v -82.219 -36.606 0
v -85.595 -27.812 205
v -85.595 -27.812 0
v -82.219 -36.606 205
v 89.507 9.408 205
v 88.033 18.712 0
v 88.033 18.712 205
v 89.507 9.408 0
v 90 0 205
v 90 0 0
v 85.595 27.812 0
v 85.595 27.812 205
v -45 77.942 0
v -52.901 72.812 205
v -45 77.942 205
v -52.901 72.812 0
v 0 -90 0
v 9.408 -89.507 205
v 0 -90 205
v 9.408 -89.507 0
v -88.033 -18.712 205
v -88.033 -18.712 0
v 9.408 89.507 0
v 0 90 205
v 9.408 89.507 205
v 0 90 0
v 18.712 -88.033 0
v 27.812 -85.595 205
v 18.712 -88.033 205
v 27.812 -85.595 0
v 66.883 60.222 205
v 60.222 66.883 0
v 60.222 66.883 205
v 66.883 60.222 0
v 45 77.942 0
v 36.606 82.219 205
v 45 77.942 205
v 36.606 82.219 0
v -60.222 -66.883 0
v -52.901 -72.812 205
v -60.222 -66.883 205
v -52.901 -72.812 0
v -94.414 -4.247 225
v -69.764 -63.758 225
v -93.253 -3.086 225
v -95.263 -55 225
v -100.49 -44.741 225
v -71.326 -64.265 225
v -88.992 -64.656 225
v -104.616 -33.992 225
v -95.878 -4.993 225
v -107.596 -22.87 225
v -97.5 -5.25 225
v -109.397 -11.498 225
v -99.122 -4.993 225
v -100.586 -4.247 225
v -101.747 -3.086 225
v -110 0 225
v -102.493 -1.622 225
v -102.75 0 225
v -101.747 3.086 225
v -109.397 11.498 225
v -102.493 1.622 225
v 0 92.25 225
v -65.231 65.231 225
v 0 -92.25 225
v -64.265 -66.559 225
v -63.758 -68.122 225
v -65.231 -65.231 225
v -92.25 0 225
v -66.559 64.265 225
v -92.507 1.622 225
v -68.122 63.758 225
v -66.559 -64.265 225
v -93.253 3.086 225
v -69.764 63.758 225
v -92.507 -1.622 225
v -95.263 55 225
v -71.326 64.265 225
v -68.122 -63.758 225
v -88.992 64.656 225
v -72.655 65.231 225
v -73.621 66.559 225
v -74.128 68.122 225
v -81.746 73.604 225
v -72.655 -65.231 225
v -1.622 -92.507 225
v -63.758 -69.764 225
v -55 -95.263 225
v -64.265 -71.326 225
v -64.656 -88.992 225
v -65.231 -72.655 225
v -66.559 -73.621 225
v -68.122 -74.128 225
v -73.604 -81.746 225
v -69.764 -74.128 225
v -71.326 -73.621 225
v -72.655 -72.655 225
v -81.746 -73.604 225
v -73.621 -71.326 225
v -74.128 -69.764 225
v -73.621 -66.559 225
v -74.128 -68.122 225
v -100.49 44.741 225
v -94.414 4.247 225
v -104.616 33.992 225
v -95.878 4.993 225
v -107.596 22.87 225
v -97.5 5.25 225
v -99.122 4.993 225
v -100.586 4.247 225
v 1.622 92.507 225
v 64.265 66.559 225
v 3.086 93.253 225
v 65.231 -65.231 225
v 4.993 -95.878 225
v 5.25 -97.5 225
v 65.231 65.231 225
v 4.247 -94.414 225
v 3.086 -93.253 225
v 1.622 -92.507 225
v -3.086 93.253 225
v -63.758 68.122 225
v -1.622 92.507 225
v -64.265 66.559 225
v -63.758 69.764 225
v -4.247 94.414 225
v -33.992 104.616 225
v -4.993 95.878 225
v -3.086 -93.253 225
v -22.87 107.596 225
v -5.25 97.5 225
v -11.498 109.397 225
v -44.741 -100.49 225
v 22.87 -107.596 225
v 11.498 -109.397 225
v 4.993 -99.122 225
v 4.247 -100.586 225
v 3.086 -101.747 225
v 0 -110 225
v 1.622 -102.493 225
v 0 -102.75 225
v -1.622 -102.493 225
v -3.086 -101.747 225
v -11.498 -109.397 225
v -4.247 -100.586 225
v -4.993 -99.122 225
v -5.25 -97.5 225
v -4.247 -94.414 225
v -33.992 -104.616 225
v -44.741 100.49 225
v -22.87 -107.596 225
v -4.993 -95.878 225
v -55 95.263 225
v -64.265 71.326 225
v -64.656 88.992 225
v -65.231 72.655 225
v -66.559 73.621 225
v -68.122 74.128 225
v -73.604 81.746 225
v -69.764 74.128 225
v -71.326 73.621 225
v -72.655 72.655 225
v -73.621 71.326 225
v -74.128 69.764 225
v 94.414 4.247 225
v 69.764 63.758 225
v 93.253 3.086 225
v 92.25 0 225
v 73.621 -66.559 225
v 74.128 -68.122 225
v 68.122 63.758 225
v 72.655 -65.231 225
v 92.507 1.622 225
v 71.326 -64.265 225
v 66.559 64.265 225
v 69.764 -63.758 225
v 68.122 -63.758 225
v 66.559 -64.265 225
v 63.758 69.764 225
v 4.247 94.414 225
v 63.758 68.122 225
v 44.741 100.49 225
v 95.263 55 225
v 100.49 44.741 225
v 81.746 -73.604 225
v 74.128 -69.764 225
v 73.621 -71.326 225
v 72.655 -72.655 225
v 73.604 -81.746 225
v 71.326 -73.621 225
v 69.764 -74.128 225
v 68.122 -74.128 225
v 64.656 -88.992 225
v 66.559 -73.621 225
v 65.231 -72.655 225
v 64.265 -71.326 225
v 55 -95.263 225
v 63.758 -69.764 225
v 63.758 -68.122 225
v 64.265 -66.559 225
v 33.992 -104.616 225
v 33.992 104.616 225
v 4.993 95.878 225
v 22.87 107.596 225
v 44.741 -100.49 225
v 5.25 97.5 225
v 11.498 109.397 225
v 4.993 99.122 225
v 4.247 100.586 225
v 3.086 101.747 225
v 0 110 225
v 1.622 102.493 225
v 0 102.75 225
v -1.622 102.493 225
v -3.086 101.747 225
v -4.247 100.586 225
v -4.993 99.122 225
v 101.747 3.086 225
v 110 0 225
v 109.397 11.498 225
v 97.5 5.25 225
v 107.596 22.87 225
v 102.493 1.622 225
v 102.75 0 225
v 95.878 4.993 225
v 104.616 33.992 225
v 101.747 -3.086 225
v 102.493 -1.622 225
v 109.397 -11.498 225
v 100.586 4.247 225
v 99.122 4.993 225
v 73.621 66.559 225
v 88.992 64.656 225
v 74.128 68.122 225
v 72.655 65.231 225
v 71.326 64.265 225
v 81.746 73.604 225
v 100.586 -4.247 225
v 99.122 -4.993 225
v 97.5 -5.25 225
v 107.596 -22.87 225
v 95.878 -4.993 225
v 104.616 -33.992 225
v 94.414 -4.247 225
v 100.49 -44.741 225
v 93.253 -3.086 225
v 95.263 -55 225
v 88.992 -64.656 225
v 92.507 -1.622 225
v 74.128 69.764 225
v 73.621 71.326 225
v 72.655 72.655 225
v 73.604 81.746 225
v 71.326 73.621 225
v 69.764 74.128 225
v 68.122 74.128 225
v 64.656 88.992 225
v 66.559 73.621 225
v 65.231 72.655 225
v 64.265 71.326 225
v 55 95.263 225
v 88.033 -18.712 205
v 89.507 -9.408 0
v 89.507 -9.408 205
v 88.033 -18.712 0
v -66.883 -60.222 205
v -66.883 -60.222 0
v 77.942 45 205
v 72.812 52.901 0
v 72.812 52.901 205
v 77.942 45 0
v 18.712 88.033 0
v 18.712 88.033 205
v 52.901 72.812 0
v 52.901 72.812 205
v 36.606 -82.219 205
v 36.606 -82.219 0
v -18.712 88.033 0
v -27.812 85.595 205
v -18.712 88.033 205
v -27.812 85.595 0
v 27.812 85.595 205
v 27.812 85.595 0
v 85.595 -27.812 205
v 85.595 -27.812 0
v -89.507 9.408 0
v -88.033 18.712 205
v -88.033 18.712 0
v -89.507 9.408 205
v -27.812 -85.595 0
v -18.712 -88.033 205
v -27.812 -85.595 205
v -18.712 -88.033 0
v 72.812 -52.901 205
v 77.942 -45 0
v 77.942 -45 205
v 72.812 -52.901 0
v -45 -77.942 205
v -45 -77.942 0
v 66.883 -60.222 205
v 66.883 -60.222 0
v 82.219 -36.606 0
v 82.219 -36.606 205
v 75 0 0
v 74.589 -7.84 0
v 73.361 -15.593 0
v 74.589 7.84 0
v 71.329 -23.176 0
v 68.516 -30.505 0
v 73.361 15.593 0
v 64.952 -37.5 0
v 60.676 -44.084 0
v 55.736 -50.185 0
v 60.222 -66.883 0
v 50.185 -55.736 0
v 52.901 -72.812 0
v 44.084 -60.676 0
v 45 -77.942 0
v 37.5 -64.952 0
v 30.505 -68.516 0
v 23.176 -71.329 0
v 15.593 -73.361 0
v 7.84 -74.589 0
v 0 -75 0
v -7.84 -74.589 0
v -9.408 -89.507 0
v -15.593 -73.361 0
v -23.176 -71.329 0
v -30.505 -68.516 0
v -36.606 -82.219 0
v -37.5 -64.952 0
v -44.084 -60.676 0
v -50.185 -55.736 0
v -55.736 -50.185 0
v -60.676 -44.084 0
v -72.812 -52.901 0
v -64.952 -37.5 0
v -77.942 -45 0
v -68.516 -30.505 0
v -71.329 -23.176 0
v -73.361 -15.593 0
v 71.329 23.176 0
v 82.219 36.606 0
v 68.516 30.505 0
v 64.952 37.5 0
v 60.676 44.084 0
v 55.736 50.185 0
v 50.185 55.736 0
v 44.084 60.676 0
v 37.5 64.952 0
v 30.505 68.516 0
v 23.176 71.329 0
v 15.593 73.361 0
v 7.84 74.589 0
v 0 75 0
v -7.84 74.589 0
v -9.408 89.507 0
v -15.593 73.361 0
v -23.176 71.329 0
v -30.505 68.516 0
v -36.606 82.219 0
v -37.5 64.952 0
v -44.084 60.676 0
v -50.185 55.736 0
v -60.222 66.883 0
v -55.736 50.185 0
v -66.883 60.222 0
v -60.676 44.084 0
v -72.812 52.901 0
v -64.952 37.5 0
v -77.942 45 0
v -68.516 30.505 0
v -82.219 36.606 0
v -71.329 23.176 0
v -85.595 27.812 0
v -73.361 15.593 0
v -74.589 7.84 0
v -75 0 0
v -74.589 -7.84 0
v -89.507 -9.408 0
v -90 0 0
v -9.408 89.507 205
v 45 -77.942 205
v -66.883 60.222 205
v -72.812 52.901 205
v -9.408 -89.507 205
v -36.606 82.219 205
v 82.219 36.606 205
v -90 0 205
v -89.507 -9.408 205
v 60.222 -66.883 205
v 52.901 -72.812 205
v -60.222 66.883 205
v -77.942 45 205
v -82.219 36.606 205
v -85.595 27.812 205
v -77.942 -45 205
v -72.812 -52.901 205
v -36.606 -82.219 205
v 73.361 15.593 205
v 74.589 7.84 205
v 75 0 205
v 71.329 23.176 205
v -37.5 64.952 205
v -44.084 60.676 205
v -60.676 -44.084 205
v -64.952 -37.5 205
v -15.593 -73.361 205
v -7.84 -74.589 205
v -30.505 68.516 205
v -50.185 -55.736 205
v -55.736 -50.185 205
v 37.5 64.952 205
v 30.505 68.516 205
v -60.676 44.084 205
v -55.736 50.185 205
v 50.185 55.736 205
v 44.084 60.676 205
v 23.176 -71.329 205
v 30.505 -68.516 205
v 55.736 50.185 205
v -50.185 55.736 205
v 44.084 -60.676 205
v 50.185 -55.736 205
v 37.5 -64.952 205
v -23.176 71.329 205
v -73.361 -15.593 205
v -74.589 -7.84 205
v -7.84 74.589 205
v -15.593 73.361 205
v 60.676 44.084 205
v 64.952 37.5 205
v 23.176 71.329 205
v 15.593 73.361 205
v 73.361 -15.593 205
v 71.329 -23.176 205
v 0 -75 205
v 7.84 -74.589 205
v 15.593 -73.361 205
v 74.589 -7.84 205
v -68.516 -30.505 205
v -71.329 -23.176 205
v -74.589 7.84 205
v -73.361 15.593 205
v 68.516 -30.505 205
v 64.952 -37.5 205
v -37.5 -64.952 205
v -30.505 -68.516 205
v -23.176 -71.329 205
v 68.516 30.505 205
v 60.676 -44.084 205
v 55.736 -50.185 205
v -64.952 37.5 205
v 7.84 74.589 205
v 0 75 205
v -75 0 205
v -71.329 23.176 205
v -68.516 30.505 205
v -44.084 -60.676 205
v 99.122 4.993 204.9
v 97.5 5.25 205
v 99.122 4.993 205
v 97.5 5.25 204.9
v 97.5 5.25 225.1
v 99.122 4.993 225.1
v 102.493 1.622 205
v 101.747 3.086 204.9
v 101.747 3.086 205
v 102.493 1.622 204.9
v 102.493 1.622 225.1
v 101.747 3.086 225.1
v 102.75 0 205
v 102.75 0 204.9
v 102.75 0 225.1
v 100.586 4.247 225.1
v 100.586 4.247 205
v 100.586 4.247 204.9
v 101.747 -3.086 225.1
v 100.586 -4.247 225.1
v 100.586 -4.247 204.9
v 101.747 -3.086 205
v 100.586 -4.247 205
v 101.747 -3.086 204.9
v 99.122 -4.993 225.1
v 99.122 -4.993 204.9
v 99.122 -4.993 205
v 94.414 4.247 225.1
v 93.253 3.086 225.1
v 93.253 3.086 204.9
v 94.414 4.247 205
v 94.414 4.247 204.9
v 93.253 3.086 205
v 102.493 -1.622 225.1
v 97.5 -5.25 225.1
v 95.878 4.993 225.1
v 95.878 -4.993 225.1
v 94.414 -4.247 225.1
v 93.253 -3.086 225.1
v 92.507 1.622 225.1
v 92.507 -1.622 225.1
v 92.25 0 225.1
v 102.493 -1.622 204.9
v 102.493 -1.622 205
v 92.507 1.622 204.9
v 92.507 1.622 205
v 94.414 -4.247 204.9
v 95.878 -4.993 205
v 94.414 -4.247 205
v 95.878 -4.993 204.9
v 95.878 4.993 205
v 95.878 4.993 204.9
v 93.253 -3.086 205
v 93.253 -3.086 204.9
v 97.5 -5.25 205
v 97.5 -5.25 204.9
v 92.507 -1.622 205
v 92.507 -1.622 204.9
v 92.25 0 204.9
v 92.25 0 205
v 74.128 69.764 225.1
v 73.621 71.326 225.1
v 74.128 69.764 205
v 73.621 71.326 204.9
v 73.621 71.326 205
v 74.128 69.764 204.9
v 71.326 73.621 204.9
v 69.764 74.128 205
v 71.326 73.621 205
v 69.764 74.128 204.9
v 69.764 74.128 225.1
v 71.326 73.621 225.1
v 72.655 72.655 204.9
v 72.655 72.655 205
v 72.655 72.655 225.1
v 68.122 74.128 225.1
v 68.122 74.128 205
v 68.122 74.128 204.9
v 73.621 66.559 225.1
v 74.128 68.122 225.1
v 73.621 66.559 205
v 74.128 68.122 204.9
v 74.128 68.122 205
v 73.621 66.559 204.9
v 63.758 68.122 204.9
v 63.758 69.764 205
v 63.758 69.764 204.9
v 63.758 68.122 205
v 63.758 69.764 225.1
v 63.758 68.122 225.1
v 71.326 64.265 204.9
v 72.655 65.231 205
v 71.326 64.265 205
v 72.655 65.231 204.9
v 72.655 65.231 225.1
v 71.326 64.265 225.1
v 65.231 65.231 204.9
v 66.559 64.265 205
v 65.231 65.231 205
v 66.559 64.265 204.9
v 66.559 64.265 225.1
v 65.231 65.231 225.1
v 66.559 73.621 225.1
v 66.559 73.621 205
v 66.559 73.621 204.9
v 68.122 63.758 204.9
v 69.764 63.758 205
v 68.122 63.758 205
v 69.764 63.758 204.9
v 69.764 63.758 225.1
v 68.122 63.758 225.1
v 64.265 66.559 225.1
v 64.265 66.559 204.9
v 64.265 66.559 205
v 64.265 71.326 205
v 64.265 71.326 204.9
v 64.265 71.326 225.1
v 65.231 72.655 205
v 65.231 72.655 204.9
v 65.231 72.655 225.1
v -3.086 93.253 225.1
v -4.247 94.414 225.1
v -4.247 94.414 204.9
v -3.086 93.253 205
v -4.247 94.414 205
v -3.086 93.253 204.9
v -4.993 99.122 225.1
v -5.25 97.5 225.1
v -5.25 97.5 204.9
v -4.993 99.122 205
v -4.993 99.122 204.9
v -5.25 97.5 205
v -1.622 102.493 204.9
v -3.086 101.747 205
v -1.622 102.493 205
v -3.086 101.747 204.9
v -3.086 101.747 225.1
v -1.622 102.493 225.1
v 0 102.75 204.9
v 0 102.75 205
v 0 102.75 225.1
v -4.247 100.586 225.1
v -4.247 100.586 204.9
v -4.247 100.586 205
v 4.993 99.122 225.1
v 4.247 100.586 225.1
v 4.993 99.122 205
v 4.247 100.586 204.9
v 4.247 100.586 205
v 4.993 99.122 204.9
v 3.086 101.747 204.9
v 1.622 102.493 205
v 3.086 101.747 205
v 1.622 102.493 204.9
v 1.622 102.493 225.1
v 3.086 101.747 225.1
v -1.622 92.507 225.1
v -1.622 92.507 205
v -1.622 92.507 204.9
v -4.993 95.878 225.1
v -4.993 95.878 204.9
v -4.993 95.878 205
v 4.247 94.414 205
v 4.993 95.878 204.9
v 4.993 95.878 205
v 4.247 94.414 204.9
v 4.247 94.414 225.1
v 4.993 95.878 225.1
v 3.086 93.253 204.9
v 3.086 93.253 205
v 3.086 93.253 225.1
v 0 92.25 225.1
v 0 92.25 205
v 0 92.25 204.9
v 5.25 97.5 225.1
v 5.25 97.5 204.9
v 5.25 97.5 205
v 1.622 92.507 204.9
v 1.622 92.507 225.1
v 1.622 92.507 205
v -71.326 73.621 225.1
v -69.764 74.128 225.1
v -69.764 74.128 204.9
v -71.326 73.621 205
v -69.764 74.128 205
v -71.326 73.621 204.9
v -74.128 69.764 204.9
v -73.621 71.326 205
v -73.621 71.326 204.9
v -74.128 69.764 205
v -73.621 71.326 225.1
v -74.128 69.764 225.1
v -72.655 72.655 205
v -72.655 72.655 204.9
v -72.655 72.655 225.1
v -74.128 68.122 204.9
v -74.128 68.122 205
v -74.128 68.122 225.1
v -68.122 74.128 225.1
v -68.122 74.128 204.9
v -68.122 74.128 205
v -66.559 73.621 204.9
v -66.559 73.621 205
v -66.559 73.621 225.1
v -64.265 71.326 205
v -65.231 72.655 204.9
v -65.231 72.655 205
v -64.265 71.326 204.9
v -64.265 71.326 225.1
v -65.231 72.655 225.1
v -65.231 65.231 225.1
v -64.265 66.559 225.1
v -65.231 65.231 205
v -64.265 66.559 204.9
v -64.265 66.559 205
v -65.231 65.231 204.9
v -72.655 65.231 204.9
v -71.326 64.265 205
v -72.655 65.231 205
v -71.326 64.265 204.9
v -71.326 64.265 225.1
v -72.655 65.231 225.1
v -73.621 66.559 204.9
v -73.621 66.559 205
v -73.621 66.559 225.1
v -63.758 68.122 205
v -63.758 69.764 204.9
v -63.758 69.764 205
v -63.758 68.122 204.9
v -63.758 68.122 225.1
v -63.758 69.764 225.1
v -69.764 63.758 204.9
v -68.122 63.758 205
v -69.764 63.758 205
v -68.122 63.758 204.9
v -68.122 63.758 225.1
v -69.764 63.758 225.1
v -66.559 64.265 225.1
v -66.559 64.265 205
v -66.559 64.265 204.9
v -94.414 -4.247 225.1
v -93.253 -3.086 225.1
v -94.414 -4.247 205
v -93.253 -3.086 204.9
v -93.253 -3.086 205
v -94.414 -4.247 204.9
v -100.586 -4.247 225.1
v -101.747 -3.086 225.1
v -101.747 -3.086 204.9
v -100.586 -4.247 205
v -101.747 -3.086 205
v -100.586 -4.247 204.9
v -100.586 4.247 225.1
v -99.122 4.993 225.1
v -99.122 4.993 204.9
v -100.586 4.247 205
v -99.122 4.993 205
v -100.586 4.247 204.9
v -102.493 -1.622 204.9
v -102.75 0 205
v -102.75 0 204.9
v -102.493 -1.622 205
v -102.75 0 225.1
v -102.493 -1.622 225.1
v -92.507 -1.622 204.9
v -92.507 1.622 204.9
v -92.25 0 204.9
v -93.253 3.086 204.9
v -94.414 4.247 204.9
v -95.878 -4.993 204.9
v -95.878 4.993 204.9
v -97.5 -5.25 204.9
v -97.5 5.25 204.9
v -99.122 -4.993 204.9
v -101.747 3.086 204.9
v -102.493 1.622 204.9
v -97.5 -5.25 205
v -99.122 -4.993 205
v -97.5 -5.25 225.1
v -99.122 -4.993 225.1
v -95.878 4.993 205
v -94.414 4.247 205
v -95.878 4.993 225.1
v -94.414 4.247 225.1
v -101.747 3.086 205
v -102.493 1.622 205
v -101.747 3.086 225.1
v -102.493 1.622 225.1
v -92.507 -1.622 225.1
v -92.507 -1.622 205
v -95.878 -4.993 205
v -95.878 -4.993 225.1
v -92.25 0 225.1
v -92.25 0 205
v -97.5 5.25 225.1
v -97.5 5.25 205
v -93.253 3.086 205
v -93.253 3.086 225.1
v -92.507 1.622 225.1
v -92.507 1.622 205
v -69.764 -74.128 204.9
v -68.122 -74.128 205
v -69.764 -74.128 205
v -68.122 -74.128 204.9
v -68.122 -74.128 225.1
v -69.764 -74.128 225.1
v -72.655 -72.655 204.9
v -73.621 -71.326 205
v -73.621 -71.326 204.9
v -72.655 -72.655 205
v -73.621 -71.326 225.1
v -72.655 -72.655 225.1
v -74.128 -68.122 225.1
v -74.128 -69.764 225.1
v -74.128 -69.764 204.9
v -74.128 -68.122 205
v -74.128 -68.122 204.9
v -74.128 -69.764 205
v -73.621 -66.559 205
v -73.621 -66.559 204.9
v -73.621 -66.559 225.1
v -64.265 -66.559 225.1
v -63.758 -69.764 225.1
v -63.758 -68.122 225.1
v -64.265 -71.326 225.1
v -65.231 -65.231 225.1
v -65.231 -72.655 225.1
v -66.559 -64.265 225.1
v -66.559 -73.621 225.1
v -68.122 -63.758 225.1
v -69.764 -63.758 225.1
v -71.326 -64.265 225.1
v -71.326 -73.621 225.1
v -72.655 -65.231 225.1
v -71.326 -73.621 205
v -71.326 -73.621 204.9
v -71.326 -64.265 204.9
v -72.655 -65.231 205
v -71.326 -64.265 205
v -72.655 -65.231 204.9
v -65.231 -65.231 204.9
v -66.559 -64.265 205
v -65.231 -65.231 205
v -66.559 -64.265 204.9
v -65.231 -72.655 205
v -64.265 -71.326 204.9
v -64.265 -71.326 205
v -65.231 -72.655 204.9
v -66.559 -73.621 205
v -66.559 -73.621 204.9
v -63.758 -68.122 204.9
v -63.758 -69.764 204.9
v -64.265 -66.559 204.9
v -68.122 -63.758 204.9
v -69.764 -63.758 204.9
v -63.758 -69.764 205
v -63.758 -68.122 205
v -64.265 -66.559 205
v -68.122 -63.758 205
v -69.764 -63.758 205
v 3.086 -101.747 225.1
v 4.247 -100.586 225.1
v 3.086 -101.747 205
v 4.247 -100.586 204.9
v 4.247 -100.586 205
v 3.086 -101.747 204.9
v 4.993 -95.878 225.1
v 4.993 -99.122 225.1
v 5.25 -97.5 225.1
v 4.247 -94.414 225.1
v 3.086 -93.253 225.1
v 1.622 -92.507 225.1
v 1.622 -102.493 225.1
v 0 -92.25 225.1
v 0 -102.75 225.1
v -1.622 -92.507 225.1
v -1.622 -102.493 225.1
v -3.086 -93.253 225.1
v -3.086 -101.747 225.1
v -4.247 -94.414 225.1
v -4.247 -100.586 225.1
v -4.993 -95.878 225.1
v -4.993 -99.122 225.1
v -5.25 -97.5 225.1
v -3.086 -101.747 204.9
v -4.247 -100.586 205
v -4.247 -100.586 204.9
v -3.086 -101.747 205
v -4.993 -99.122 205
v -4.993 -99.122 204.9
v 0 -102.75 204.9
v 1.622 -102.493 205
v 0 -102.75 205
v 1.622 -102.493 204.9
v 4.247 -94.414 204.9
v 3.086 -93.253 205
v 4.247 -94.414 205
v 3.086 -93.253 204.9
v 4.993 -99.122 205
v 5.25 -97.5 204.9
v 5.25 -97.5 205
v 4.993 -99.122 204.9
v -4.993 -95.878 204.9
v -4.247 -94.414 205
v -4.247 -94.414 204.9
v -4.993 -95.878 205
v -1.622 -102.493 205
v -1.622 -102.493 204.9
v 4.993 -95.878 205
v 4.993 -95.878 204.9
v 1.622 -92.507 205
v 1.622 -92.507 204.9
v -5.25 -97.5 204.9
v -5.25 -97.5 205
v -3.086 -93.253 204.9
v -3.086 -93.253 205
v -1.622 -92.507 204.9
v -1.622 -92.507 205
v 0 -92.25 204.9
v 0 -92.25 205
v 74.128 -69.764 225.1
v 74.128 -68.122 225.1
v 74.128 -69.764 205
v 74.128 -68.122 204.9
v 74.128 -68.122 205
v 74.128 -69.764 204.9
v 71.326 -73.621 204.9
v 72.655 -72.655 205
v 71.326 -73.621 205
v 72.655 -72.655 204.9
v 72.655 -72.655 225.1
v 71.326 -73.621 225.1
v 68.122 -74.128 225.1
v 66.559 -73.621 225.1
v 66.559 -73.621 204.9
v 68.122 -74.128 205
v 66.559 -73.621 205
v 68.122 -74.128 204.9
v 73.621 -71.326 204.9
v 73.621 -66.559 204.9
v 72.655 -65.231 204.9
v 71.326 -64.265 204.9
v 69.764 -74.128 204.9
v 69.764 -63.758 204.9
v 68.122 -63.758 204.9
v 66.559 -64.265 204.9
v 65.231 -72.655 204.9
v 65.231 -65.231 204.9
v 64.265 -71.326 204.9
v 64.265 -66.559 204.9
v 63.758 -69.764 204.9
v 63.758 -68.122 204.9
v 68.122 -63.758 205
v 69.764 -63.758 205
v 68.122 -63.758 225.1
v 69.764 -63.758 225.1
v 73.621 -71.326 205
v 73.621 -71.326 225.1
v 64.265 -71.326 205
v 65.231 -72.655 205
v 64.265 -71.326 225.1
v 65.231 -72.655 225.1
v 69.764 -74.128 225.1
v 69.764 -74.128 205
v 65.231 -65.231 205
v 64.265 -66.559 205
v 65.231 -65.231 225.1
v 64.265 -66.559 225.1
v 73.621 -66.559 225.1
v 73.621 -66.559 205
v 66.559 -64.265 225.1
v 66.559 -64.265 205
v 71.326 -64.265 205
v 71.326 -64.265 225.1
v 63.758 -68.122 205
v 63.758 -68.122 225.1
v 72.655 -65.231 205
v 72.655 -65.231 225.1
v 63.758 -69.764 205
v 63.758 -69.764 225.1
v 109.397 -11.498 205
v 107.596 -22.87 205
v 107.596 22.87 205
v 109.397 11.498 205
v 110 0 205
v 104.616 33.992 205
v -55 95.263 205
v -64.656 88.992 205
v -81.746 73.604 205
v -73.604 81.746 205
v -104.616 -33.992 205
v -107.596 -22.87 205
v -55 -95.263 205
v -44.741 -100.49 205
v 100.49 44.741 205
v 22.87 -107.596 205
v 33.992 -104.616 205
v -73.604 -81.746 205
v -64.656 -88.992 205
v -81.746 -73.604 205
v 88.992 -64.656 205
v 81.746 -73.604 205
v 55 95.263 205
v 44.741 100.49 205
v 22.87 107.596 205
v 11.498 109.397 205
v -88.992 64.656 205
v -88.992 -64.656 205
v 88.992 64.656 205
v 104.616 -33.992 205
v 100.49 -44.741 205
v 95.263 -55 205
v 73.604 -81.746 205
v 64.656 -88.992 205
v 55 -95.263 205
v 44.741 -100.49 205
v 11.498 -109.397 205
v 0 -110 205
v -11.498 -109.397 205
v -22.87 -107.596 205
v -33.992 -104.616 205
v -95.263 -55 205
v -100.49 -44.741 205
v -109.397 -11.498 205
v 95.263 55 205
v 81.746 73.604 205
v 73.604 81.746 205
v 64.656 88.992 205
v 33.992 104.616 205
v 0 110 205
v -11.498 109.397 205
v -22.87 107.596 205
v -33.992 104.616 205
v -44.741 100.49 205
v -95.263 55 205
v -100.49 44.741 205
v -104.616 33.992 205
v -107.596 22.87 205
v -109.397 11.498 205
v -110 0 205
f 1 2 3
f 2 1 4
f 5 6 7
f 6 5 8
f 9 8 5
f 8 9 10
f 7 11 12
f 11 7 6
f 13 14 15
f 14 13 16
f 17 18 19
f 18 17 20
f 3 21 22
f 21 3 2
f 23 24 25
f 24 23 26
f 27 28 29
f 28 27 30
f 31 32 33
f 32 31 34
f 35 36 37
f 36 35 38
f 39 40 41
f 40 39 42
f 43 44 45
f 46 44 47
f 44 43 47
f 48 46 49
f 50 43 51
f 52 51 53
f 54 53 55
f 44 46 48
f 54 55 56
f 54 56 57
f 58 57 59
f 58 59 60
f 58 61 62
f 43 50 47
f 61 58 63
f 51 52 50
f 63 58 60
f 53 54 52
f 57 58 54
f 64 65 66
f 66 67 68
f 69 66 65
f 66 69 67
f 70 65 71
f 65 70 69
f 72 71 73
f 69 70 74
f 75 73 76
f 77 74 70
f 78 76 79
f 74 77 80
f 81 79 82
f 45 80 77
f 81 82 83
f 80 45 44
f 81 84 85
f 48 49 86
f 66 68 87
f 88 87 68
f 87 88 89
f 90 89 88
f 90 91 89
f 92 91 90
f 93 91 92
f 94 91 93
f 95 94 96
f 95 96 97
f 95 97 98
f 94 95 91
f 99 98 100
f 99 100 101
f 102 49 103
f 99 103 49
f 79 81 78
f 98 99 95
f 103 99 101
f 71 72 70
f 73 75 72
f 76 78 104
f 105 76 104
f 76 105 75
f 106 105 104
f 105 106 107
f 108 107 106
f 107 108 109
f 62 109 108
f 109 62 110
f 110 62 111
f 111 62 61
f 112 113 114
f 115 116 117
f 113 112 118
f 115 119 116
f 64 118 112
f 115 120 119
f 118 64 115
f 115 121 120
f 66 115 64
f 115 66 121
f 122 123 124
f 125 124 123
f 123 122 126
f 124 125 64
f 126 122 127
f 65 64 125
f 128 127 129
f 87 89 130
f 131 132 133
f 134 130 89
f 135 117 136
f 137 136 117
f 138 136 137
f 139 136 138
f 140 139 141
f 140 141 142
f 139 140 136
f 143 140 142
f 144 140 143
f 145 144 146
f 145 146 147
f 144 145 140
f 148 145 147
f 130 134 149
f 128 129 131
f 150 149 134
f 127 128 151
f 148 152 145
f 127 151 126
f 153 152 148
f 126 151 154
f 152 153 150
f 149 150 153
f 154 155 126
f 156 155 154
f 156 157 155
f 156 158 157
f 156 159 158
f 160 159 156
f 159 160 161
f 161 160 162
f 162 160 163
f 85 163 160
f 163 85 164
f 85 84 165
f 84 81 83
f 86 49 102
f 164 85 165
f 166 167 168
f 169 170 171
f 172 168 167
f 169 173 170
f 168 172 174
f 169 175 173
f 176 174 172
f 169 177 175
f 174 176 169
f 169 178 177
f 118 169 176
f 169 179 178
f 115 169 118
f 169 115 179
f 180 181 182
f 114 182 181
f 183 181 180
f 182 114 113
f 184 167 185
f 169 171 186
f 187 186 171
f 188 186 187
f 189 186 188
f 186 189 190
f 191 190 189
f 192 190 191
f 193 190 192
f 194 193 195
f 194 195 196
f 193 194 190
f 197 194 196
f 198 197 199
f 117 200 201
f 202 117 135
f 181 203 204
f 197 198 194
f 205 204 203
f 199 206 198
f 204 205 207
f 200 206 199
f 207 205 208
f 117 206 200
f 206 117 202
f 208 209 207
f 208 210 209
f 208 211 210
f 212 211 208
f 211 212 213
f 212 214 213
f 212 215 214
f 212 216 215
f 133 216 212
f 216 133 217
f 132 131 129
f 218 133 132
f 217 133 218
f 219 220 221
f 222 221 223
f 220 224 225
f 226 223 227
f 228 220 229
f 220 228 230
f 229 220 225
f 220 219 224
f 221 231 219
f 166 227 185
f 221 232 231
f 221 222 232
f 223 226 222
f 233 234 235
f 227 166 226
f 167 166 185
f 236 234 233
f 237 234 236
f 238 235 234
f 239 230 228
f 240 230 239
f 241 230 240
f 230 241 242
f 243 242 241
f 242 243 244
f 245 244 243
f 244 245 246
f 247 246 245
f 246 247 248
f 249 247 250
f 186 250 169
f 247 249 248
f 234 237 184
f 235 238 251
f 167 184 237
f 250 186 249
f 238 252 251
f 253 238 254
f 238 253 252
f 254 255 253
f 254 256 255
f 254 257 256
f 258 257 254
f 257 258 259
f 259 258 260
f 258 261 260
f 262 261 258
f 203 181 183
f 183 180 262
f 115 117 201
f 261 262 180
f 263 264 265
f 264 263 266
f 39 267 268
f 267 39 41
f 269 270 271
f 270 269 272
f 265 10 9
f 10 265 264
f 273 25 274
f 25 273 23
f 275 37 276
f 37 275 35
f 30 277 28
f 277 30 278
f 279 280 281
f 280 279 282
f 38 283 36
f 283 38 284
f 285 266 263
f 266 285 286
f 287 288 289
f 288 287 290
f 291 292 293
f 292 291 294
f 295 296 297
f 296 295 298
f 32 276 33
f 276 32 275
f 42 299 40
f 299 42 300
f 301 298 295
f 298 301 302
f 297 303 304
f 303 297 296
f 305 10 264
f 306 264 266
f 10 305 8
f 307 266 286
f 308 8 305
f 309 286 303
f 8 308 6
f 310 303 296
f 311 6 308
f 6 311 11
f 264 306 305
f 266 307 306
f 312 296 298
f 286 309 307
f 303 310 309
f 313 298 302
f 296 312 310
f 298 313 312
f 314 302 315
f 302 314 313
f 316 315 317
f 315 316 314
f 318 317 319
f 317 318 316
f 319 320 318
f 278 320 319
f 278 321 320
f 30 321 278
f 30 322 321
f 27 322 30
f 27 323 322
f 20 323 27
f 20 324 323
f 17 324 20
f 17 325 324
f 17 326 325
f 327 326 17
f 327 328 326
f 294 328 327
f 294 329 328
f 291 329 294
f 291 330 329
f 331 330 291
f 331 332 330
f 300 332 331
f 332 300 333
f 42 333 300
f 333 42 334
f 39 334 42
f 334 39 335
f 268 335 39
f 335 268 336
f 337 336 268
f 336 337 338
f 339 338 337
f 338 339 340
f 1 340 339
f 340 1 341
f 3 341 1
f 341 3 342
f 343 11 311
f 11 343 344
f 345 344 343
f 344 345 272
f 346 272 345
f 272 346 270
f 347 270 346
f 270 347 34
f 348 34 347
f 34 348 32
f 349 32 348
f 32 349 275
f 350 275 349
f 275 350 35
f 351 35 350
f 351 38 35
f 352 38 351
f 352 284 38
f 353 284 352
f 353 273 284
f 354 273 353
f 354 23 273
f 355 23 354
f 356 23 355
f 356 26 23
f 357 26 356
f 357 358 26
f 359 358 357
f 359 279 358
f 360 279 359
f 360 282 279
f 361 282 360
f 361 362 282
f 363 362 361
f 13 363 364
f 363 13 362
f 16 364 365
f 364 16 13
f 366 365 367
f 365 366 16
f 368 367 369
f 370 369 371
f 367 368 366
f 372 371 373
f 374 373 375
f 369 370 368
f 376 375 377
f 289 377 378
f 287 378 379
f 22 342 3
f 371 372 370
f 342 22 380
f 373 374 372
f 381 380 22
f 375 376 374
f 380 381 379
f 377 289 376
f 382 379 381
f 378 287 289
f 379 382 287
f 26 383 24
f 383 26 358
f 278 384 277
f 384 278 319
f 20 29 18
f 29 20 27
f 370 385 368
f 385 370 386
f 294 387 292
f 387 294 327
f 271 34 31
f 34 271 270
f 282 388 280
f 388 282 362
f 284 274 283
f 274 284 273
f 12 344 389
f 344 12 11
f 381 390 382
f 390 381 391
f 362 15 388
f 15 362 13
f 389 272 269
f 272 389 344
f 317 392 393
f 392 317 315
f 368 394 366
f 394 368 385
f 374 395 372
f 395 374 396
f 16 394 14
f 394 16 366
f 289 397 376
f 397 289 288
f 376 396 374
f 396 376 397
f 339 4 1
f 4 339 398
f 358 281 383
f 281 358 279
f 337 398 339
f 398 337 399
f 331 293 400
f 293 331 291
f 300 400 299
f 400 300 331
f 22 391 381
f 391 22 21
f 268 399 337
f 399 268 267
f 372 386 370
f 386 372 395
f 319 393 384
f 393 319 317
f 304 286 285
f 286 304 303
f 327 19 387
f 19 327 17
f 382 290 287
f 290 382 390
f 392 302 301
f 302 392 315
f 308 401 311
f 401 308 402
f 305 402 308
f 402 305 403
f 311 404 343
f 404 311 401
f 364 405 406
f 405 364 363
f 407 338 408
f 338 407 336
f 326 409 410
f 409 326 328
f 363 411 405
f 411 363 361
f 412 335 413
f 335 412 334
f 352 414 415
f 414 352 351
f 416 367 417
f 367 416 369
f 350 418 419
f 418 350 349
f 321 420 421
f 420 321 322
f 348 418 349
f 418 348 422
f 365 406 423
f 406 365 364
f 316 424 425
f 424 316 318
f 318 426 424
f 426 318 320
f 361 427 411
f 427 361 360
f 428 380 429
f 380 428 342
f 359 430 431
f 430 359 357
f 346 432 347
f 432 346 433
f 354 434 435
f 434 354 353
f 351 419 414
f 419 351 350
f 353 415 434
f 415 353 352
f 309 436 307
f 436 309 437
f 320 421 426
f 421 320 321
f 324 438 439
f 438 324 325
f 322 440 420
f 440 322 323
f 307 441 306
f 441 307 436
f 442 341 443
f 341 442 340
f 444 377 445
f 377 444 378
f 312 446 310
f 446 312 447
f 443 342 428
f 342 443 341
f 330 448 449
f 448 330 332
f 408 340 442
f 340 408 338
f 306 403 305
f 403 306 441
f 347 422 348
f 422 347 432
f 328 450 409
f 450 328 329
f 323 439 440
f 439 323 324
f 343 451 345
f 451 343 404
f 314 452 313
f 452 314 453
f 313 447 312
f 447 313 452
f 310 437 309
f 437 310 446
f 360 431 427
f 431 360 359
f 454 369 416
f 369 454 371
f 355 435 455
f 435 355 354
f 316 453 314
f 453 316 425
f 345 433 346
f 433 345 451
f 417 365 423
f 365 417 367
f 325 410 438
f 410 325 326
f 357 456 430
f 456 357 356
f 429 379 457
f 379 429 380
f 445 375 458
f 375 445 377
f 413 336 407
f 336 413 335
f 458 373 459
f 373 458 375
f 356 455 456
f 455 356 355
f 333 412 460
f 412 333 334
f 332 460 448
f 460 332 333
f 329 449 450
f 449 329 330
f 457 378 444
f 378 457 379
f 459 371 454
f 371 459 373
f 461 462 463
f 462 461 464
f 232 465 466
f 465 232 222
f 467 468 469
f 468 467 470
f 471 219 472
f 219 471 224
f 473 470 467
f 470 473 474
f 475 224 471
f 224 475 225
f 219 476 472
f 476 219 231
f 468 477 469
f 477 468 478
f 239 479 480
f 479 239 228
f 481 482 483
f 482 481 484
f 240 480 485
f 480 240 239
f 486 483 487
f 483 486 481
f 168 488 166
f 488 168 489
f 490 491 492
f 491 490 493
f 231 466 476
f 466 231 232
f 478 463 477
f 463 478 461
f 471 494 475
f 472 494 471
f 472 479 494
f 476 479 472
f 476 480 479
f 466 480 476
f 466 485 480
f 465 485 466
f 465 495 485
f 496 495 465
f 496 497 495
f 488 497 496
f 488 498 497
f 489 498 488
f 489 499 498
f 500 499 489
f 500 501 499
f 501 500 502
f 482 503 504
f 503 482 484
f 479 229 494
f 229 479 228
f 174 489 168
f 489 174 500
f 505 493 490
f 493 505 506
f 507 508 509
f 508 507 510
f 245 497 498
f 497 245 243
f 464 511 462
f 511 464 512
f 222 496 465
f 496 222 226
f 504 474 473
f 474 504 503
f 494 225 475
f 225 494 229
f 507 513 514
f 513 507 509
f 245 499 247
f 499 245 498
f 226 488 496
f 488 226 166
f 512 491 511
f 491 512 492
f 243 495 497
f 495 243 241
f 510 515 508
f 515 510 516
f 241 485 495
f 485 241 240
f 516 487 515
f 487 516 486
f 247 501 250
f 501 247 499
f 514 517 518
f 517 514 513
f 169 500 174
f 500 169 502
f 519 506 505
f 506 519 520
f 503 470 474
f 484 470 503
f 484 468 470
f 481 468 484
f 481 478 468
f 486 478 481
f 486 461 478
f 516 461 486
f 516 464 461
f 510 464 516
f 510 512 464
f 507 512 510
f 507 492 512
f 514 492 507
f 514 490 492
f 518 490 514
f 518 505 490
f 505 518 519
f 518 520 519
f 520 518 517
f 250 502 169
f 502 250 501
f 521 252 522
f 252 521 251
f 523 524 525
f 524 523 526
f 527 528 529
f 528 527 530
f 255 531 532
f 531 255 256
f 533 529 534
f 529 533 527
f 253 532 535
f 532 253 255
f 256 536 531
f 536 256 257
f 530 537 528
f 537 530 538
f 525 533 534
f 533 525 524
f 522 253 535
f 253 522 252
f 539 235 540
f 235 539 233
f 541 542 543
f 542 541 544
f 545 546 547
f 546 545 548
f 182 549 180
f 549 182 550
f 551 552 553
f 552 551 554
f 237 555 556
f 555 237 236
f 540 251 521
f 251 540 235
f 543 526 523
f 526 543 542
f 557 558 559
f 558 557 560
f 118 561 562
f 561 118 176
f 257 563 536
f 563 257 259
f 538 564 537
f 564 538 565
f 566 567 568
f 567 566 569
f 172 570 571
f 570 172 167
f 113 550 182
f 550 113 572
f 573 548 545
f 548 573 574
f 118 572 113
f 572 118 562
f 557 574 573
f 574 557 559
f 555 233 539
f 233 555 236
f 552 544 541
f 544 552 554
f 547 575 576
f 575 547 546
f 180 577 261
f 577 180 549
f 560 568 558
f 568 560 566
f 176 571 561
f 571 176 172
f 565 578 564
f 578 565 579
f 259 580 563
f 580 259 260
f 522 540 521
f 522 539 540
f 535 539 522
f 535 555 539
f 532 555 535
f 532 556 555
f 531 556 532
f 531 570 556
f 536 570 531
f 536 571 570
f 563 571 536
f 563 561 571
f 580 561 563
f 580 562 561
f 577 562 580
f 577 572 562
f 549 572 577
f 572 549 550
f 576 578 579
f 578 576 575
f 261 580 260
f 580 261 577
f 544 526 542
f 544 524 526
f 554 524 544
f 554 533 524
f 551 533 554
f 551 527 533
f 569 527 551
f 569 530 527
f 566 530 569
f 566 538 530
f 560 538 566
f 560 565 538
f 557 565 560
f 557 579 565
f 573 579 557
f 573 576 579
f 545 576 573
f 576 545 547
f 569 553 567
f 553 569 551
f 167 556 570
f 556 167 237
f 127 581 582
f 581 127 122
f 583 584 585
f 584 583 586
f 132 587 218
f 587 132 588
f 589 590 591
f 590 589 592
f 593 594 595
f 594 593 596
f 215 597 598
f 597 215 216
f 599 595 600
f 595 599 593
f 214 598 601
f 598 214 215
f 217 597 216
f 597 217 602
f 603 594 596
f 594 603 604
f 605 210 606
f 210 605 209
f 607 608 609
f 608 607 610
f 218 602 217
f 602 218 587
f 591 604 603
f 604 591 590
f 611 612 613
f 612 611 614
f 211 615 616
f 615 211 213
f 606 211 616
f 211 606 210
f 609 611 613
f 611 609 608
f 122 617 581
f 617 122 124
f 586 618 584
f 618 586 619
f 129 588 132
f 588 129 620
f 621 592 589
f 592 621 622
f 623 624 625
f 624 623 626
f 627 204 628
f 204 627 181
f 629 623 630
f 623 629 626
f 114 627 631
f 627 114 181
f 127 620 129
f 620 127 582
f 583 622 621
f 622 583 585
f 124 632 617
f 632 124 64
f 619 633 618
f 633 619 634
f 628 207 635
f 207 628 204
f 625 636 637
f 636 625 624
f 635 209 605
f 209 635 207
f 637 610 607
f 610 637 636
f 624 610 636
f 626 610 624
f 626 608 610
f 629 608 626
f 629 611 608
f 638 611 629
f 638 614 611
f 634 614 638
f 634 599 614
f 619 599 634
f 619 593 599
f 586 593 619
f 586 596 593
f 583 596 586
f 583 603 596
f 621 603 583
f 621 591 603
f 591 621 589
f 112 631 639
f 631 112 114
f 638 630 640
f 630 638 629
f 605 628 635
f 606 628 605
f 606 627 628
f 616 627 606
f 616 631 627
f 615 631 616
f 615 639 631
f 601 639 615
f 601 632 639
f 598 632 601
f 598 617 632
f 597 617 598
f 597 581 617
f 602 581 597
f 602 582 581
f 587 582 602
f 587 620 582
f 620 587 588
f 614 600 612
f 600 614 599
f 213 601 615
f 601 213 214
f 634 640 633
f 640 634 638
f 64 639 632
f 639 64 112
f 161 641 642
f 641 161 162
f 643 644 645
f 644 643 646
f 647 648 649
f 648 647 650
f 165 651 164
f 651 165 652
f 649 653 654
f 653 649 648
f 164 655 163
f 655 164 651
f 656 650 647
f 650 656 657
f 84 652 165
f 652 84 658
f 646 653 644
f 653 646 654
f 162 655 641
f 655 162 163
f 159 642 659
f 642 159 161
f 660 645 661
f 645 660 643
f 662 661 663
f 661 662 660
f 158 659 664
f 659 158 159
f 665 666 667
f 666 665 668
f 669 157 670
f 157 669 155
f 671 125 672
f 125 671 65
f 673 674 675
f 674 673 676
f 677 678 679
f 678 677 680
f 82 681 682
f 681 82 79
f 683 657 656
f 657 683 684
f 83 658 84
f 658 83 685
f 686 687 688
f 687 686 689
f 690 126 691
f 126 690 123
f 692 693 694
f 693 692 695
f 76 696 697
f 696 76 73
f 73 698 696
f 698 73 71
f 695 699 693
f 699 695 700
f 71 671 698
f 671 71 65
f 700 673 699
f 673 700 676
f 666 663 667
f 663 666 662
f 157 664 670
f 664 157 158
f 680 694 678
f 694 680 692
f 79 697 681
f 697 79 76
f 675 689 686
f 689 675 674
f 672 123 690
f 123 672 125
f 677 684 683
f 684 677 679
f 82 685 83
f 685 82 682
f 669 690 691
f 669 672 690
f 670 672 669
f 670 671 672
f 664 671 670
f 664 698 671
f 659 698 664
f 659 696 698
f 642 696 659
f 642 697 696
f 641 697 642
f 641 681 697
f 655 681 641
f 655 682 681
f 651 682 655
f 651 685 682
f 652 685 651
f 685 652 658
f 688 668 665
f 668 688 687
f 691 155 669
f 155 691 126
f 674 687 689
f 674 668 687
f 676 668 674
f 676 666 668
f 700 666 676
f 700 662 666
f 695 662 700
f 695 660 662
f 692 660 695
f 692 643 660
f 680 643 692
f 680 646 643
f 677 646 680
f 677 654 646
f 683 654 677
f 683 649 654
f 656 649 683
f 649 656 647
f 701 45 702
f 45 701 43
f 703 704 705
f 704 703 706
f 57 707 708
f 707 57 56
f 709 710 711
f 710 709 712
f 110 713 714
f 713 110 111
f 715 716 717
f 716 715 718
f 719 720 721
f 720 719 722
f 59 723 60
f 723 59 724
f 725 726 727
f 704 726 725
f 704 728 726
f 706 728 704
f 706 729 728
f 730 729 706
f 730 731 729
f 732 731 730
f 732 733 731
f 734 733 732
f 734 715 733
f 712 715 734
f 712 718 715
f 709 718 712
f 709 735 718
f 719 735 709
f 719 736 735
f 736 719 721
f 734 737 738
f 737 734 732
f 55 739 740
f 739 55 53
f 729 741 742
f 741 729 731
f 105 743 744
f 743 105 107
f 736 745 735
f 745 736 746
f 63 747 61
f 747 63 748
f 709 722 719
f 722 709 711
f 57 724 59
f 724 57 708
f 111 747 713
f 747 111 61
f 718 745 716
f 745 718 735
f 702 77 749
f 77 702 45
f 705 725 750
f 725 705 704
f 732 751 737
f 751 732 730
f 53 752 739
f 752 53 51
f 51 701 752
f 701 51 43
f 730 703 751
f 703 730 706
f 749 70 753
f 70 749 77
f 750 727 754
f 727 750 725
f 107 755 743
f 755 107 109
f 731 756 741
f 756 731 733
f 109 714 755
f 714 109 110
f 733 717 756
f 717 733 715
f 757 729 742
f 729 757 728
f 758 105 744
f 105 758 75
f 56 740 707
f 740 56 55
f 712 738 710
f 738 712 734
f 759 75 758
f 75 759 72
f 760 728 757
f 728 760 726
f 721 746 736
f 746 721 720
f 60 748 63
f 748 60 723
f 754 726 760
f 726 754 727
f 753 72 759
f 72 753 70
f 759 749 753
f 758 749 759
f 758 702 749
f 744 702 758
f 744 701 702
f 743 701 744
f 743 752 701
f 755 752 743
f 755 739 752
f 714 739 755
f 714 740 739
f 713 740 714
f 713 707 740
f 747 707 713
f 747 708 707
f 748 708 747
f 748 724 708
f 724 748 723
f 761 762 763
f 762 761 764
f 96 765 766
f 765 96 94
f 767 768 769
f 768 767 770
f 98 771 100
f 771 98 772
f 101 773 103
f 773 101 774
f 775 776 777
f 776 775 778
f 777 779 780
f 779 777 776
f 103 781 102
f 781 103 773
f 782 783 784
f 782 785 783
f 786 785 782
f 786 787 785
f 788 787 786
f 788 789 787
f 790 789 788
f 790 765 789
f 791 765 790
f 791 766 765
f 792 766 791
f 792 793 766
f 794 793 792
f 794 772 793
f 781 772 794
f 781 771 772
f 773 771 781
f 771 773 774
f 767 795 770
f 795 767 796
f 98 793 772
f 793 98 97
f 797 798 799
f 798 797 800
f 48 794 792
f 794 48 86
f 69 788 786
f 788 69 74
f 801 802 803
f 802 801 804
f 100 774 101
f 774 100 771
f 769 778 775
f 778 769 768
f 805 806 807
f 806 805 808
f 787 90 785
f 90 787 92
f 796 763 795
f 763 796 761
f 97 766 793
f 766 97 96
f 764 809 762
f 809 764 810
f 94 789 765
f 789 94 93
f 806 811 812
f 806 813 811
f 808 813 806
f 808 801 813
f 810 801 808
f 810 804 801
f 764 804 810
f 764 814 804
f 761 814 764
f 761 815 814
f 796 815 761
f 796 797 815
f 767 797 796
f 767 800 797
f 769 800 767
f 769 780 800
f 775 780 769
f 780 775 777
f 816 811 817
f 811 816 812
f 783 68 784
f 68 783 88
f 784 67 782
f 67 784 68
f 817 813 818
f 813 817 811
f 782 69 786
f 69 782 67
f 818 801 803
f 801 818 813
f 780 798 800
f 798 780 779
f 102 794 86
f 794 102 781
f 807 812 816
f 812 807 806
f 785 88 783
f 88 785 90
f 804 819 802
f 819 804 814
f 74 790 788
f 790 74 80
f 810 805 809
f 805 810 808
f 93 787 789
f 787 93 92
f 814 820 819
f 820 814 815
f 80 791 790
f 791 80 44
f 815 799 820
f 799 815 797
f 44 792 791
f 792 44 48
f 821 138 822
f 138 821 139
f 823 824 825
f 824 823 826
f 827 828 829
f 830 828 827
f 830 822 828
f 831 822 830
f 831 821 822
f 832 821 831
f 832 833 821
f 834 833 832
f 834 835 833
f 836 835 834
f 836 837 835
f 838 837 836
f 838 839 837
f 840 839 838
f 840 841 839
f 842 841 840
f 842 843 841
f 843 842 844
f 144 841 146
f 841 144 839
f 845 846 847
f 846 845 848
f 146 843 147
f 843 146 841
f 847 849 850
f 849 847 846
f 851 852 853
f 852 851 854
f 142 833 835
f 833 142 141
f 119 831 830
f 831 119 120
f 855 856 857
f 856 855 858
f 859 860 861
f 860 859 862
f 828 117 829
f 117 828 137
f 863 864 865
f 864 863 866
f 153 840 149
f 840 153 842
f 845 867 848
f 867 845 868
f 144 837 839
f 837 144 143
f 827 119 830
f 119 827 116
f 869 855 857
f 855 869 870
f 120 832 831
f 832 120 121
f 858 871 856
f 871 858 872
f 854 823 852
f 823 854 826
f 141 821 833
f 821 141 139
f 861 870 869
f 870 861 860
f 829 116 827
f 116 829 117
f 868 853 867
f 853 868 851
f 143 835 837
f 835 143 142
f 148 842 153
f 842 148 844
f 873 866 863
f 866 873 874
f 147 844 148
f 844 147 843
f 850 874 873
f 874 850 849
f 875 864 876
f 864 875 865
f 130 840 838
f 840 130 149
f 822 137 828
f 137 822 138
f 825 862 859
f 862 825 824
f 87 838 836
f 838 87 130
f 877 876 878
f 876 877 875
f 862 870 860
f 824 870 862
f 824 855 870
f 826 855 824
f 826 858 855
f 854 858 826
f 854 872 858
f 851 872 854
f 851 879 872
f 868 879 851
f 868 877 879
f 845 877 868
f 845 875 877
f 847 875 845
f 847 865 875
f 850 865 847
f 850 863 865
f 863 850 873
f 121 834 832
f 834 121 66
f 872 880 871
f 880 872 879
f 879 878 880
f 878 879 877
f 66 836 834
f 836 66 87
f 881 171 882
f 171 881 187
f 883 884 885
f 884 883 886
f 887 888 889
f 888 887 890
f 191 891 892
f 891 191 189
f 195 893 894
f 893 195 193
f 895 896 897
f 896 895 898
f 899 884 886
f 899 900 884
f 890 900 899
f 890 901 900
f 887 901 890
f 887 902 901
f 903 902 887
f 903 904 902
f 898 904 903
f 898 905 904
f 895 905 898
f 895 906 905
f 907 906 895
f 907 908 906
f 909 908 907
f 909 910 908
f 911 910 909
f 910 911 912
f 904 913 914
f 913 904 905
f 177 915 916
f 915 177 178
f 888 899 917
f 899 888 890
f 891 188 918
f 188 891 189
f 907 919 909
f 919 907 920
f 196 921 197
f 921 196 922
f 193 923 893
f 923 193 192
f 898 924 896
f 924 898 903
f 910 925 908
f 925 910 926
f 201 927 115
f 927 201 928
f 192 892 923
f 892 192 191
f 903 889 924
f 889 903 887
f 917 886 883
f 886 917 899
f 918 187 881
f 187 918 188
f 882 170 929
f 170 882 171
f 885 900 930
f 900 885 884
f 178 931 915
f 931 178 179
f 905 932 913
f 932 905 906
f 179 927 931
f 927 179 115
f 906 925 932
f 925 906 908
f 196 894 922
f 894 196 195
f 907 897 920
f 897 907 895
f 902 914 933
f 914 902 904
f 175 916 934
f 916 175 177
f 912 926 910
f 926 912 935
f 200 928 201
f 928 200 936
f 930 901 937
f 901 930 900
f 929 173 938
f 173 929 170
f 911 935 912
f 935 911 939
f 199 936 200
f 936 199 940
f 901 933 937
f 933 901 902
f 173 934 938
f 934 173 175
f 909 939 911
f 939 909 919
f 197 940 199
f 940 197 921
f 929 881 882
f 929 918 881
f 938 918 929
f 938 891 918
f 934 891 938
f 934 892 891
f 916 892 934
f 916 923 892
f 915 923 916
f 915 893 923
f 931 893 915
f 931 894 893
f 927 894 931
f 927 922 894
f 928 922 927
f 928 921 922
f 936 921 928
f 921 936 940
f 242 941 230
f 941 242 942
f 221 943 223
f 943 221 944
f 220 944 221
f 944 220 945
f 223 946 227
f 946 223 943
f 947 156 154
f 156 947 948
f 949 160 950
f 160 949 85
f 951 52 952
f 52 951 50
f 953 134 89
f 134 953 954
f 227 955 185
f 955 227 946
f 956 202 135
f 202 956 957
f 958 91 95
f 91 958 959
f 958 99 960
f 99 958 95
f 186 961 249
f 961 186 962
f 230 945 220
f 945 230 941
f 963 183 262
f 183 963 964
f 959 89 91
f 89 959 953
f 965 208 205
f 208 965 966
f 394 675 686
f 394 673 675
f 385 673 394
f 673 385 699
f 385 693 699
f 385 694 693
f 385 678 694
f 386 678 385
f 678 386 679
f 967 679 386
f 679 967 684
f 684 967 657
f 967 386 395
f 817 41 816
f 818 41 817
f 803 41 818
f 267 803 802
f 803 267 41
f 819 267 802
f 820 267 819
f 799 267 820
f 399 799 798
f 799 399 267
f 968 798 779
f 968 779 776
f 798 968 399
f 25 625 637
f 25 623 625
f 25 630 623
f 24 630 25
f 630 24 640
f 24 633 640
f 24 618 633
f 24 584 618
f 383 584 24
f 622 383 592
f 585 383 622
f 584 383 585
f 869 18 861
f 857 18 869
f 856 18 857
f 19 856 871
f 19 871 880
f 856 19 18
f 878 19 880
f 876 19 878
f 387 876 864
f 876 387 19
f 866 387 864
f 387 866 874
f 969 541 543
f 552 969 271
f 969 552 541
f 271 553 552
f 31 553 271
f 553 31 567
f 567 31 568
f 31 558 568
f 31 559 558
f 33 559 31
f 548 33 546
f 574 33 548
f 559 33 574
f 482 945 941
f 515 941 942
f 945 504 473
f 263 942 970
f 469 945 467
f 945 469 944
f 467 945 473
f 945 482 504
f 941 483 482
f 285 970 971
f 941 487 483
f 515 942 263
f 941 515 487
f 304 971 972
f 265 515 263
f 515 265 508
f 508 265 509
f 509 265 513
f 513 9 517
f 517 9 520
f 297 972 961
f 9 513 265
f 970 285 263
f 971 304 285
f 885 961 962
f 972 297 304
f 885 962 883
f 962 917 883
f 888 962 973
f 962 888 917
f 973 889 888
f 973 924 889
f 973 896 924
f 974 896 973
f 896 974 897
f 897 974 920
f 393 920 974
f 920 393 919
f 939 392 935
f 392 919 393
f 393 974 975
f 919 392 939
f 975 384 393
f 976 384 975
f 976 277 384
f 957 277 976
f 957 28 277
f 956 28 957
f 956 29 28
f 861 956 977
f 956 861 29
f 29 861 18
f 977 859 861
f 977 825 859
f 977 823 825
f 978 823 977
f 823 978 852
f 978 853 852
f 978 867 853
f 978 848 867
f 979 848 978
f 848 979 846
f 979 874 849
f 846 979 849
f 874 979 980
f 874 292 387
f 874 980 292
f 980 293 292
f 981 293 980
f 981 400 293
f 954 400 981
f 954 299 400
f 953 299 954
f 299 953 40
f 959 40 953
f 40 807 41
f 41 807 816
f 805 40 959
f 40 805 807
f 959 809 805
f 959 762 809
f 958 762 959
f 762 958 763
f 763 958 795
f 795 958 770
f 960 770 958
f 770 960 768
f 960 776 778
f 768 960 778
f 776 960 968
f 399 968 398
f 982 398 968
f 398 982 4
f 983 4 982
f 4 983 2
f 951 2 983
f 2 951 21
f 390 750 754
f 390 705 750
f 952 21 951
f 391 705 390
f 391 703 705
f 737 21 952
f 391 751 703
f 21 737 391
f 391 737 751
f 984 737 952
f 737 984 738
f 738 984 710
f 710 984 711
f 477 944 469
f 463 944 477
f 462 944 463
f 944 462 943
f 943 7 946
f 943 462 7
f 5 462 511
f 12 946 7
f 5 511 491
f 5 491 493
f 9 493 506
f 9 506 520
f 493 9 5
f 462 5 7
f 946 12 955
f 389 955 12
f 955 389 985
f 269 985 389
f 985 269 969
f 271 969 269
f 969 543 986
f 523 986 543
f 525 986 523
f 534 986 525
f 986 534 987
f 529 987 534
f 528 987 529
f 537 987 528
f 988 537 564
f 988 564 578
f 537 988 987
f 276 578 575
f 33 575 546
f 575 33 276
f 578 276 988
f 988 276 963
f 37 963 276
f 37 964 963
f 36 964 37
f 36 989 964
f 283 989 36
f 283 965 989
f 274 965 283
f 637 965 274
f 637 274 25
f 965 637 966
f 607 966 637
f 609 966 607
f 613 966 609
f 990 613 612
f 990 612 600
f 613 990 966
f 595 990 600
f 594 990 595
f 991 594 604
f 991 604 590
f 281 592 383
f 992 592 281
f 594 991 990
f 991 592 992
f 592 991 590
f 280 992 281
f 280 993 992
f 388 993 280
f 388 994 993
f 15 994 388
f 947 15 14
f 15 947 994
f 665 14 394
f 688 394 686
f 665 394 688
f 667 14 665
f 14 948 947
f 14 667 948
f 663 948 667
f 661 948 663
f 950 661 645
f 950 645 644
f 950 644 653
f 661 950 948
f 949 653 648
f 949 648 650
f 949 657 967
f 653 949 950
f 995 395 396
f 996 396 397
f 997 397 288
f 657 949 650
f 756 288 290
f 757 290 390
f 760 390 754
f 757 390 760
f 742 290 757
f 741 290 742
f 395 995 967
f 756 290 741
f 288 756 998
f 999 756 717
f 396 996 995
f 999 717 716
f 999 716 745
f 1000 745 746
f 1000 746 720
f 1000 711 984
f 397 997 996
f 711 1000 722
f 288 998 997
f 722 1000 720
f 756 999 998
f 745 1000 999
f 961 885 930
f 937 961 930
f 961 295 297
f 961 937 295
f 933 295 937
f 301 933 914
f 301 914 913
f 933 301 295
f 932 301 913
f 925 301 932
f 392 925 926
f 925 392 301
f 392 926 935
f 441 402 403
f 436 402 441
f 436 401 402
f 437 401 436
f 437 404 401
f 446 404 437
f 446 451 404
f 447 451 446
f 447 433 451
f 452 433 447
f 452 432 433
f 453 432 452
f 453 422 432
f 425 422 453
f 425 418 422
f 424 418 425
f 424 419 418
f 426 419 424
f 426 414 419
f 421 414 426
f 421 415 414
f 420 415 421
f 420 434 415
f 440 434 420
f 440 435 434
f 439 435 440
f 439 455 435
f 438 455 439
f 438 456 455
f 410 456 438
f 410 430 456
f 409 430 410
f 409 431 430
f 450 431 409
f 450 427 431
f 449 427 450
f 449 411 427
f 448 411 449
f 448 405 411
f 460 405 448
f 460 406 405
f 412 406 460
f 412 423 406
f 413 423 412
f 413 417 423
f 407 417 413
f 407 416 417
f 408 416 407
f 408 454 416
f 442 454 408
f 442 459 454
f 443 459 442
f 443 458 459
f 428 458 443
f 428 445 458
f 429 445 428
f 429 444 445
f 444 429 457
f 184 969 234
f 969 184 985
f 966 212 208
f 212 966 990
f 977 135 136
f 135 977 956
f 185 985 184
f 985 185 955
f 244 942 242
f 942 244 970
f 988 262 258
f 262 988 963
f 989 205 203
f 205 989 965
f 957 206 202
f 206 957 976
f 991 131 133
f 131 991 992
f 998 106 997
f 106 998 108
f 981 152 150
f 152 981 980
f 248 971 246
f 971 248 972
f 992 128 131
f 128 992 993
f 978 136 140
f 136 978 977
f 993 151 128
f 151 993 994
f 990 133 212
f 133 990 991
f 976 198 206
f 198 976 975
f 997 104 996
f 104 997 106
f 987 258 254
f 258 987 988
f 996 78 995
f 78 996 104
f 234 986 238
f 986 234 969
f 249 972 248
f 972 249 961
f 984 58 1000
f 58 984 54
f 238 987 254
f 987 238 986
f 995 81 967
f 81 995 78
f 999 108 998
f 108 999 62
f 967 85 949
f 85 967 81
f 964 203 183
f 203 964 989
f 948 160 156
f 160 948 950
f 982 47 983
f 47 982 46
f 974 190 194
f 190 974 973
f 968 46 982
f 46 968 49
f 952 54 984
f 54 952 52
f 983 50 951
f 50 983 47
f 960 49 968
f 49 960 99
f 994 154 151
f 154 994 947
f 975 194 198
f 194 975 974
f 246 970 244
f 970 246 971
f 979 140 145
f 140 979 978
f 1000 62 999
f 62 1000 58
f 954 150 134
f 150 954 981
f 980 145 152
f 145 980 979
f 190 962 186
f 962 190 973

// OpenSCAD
// Cuerpo_Reactor.scad
// Unidades: milímetros (mm). Diseñado para 5 kg de MH.

// --- Parámetros de Diseño ---
D_INT = 150;      // Diámetro Interno (D)
L_INT = 225;      // Longitud Interna (L)
T_PARED = 15;     // Espesor de la pared para alta presión (ej. 30+ bar)
D_EXT = D_INT + 2*T_PARED; // Diámetro Exterior (180 mm)

// --- Parámetros de la Brida (Flange) ---
T_BRIDA = 20;     // Espesor de la brida para rigidez
D_BRIDA_EXT = D_EXT + 40; // Diámetro exterior de la brida (220 mm)
N_PERNOS = 8;     // Número de pernos M10
D_PERNO = 10.5;   // Diámetro del orificio del perno
PCD_BRIDA = 195;  // Diámetro del Círculo de Paso (Pitch Circle Diameter)

// ----------------------------------------------------------------------

module Brida() {
  // Cilindro de la brida
  cylinder(h = T_BRIDA, r = D_BRIDA_EXT / 2, $fn = 60);

  // Perforaciones de la brida para los pernos
  for (i = [0 : 360/N_PERNOS : 360 - (360/N_PERNOS)]) {
    rotate([0, 0, i]) {
      translate([PCD_BRIDA / 2, 0, -0.1]) {
        // El cilindro de la perforación debe atravesar la brida
        cylinder(h = T_BRIDA + 0.2, r = D_PERNO / 2, $fn = 20);
      }
    }
  }
}

module CuerpoReactor() {
  // 1. Cuerpo Principal (Tubo)
  difference() {
    // Cilindro Exterior
    cylinder(h = L_INT, r = D_EXT / 2, $fn = 60);

    // Vaciado Interno
    // NOTA: Se añade +0.1 a la altura para asegurar el vaciado completo en Z=0
    translate([0, 0, 0]) {
      cylinder(h = L_INT + 0.1, r = D_INT / 2, $fn = 60);
    }
  }

  // 2. Brida Superior (unida al cuerpo)
  // La brida se coloca en el extremo superior del cilindro (L_INT - T_BRIDA)
  translate([0, 0, L_INT - T_BRIDA]) { 
      Brida();
  }
}

// Visualización del Módulo
CuerpoReactor();
